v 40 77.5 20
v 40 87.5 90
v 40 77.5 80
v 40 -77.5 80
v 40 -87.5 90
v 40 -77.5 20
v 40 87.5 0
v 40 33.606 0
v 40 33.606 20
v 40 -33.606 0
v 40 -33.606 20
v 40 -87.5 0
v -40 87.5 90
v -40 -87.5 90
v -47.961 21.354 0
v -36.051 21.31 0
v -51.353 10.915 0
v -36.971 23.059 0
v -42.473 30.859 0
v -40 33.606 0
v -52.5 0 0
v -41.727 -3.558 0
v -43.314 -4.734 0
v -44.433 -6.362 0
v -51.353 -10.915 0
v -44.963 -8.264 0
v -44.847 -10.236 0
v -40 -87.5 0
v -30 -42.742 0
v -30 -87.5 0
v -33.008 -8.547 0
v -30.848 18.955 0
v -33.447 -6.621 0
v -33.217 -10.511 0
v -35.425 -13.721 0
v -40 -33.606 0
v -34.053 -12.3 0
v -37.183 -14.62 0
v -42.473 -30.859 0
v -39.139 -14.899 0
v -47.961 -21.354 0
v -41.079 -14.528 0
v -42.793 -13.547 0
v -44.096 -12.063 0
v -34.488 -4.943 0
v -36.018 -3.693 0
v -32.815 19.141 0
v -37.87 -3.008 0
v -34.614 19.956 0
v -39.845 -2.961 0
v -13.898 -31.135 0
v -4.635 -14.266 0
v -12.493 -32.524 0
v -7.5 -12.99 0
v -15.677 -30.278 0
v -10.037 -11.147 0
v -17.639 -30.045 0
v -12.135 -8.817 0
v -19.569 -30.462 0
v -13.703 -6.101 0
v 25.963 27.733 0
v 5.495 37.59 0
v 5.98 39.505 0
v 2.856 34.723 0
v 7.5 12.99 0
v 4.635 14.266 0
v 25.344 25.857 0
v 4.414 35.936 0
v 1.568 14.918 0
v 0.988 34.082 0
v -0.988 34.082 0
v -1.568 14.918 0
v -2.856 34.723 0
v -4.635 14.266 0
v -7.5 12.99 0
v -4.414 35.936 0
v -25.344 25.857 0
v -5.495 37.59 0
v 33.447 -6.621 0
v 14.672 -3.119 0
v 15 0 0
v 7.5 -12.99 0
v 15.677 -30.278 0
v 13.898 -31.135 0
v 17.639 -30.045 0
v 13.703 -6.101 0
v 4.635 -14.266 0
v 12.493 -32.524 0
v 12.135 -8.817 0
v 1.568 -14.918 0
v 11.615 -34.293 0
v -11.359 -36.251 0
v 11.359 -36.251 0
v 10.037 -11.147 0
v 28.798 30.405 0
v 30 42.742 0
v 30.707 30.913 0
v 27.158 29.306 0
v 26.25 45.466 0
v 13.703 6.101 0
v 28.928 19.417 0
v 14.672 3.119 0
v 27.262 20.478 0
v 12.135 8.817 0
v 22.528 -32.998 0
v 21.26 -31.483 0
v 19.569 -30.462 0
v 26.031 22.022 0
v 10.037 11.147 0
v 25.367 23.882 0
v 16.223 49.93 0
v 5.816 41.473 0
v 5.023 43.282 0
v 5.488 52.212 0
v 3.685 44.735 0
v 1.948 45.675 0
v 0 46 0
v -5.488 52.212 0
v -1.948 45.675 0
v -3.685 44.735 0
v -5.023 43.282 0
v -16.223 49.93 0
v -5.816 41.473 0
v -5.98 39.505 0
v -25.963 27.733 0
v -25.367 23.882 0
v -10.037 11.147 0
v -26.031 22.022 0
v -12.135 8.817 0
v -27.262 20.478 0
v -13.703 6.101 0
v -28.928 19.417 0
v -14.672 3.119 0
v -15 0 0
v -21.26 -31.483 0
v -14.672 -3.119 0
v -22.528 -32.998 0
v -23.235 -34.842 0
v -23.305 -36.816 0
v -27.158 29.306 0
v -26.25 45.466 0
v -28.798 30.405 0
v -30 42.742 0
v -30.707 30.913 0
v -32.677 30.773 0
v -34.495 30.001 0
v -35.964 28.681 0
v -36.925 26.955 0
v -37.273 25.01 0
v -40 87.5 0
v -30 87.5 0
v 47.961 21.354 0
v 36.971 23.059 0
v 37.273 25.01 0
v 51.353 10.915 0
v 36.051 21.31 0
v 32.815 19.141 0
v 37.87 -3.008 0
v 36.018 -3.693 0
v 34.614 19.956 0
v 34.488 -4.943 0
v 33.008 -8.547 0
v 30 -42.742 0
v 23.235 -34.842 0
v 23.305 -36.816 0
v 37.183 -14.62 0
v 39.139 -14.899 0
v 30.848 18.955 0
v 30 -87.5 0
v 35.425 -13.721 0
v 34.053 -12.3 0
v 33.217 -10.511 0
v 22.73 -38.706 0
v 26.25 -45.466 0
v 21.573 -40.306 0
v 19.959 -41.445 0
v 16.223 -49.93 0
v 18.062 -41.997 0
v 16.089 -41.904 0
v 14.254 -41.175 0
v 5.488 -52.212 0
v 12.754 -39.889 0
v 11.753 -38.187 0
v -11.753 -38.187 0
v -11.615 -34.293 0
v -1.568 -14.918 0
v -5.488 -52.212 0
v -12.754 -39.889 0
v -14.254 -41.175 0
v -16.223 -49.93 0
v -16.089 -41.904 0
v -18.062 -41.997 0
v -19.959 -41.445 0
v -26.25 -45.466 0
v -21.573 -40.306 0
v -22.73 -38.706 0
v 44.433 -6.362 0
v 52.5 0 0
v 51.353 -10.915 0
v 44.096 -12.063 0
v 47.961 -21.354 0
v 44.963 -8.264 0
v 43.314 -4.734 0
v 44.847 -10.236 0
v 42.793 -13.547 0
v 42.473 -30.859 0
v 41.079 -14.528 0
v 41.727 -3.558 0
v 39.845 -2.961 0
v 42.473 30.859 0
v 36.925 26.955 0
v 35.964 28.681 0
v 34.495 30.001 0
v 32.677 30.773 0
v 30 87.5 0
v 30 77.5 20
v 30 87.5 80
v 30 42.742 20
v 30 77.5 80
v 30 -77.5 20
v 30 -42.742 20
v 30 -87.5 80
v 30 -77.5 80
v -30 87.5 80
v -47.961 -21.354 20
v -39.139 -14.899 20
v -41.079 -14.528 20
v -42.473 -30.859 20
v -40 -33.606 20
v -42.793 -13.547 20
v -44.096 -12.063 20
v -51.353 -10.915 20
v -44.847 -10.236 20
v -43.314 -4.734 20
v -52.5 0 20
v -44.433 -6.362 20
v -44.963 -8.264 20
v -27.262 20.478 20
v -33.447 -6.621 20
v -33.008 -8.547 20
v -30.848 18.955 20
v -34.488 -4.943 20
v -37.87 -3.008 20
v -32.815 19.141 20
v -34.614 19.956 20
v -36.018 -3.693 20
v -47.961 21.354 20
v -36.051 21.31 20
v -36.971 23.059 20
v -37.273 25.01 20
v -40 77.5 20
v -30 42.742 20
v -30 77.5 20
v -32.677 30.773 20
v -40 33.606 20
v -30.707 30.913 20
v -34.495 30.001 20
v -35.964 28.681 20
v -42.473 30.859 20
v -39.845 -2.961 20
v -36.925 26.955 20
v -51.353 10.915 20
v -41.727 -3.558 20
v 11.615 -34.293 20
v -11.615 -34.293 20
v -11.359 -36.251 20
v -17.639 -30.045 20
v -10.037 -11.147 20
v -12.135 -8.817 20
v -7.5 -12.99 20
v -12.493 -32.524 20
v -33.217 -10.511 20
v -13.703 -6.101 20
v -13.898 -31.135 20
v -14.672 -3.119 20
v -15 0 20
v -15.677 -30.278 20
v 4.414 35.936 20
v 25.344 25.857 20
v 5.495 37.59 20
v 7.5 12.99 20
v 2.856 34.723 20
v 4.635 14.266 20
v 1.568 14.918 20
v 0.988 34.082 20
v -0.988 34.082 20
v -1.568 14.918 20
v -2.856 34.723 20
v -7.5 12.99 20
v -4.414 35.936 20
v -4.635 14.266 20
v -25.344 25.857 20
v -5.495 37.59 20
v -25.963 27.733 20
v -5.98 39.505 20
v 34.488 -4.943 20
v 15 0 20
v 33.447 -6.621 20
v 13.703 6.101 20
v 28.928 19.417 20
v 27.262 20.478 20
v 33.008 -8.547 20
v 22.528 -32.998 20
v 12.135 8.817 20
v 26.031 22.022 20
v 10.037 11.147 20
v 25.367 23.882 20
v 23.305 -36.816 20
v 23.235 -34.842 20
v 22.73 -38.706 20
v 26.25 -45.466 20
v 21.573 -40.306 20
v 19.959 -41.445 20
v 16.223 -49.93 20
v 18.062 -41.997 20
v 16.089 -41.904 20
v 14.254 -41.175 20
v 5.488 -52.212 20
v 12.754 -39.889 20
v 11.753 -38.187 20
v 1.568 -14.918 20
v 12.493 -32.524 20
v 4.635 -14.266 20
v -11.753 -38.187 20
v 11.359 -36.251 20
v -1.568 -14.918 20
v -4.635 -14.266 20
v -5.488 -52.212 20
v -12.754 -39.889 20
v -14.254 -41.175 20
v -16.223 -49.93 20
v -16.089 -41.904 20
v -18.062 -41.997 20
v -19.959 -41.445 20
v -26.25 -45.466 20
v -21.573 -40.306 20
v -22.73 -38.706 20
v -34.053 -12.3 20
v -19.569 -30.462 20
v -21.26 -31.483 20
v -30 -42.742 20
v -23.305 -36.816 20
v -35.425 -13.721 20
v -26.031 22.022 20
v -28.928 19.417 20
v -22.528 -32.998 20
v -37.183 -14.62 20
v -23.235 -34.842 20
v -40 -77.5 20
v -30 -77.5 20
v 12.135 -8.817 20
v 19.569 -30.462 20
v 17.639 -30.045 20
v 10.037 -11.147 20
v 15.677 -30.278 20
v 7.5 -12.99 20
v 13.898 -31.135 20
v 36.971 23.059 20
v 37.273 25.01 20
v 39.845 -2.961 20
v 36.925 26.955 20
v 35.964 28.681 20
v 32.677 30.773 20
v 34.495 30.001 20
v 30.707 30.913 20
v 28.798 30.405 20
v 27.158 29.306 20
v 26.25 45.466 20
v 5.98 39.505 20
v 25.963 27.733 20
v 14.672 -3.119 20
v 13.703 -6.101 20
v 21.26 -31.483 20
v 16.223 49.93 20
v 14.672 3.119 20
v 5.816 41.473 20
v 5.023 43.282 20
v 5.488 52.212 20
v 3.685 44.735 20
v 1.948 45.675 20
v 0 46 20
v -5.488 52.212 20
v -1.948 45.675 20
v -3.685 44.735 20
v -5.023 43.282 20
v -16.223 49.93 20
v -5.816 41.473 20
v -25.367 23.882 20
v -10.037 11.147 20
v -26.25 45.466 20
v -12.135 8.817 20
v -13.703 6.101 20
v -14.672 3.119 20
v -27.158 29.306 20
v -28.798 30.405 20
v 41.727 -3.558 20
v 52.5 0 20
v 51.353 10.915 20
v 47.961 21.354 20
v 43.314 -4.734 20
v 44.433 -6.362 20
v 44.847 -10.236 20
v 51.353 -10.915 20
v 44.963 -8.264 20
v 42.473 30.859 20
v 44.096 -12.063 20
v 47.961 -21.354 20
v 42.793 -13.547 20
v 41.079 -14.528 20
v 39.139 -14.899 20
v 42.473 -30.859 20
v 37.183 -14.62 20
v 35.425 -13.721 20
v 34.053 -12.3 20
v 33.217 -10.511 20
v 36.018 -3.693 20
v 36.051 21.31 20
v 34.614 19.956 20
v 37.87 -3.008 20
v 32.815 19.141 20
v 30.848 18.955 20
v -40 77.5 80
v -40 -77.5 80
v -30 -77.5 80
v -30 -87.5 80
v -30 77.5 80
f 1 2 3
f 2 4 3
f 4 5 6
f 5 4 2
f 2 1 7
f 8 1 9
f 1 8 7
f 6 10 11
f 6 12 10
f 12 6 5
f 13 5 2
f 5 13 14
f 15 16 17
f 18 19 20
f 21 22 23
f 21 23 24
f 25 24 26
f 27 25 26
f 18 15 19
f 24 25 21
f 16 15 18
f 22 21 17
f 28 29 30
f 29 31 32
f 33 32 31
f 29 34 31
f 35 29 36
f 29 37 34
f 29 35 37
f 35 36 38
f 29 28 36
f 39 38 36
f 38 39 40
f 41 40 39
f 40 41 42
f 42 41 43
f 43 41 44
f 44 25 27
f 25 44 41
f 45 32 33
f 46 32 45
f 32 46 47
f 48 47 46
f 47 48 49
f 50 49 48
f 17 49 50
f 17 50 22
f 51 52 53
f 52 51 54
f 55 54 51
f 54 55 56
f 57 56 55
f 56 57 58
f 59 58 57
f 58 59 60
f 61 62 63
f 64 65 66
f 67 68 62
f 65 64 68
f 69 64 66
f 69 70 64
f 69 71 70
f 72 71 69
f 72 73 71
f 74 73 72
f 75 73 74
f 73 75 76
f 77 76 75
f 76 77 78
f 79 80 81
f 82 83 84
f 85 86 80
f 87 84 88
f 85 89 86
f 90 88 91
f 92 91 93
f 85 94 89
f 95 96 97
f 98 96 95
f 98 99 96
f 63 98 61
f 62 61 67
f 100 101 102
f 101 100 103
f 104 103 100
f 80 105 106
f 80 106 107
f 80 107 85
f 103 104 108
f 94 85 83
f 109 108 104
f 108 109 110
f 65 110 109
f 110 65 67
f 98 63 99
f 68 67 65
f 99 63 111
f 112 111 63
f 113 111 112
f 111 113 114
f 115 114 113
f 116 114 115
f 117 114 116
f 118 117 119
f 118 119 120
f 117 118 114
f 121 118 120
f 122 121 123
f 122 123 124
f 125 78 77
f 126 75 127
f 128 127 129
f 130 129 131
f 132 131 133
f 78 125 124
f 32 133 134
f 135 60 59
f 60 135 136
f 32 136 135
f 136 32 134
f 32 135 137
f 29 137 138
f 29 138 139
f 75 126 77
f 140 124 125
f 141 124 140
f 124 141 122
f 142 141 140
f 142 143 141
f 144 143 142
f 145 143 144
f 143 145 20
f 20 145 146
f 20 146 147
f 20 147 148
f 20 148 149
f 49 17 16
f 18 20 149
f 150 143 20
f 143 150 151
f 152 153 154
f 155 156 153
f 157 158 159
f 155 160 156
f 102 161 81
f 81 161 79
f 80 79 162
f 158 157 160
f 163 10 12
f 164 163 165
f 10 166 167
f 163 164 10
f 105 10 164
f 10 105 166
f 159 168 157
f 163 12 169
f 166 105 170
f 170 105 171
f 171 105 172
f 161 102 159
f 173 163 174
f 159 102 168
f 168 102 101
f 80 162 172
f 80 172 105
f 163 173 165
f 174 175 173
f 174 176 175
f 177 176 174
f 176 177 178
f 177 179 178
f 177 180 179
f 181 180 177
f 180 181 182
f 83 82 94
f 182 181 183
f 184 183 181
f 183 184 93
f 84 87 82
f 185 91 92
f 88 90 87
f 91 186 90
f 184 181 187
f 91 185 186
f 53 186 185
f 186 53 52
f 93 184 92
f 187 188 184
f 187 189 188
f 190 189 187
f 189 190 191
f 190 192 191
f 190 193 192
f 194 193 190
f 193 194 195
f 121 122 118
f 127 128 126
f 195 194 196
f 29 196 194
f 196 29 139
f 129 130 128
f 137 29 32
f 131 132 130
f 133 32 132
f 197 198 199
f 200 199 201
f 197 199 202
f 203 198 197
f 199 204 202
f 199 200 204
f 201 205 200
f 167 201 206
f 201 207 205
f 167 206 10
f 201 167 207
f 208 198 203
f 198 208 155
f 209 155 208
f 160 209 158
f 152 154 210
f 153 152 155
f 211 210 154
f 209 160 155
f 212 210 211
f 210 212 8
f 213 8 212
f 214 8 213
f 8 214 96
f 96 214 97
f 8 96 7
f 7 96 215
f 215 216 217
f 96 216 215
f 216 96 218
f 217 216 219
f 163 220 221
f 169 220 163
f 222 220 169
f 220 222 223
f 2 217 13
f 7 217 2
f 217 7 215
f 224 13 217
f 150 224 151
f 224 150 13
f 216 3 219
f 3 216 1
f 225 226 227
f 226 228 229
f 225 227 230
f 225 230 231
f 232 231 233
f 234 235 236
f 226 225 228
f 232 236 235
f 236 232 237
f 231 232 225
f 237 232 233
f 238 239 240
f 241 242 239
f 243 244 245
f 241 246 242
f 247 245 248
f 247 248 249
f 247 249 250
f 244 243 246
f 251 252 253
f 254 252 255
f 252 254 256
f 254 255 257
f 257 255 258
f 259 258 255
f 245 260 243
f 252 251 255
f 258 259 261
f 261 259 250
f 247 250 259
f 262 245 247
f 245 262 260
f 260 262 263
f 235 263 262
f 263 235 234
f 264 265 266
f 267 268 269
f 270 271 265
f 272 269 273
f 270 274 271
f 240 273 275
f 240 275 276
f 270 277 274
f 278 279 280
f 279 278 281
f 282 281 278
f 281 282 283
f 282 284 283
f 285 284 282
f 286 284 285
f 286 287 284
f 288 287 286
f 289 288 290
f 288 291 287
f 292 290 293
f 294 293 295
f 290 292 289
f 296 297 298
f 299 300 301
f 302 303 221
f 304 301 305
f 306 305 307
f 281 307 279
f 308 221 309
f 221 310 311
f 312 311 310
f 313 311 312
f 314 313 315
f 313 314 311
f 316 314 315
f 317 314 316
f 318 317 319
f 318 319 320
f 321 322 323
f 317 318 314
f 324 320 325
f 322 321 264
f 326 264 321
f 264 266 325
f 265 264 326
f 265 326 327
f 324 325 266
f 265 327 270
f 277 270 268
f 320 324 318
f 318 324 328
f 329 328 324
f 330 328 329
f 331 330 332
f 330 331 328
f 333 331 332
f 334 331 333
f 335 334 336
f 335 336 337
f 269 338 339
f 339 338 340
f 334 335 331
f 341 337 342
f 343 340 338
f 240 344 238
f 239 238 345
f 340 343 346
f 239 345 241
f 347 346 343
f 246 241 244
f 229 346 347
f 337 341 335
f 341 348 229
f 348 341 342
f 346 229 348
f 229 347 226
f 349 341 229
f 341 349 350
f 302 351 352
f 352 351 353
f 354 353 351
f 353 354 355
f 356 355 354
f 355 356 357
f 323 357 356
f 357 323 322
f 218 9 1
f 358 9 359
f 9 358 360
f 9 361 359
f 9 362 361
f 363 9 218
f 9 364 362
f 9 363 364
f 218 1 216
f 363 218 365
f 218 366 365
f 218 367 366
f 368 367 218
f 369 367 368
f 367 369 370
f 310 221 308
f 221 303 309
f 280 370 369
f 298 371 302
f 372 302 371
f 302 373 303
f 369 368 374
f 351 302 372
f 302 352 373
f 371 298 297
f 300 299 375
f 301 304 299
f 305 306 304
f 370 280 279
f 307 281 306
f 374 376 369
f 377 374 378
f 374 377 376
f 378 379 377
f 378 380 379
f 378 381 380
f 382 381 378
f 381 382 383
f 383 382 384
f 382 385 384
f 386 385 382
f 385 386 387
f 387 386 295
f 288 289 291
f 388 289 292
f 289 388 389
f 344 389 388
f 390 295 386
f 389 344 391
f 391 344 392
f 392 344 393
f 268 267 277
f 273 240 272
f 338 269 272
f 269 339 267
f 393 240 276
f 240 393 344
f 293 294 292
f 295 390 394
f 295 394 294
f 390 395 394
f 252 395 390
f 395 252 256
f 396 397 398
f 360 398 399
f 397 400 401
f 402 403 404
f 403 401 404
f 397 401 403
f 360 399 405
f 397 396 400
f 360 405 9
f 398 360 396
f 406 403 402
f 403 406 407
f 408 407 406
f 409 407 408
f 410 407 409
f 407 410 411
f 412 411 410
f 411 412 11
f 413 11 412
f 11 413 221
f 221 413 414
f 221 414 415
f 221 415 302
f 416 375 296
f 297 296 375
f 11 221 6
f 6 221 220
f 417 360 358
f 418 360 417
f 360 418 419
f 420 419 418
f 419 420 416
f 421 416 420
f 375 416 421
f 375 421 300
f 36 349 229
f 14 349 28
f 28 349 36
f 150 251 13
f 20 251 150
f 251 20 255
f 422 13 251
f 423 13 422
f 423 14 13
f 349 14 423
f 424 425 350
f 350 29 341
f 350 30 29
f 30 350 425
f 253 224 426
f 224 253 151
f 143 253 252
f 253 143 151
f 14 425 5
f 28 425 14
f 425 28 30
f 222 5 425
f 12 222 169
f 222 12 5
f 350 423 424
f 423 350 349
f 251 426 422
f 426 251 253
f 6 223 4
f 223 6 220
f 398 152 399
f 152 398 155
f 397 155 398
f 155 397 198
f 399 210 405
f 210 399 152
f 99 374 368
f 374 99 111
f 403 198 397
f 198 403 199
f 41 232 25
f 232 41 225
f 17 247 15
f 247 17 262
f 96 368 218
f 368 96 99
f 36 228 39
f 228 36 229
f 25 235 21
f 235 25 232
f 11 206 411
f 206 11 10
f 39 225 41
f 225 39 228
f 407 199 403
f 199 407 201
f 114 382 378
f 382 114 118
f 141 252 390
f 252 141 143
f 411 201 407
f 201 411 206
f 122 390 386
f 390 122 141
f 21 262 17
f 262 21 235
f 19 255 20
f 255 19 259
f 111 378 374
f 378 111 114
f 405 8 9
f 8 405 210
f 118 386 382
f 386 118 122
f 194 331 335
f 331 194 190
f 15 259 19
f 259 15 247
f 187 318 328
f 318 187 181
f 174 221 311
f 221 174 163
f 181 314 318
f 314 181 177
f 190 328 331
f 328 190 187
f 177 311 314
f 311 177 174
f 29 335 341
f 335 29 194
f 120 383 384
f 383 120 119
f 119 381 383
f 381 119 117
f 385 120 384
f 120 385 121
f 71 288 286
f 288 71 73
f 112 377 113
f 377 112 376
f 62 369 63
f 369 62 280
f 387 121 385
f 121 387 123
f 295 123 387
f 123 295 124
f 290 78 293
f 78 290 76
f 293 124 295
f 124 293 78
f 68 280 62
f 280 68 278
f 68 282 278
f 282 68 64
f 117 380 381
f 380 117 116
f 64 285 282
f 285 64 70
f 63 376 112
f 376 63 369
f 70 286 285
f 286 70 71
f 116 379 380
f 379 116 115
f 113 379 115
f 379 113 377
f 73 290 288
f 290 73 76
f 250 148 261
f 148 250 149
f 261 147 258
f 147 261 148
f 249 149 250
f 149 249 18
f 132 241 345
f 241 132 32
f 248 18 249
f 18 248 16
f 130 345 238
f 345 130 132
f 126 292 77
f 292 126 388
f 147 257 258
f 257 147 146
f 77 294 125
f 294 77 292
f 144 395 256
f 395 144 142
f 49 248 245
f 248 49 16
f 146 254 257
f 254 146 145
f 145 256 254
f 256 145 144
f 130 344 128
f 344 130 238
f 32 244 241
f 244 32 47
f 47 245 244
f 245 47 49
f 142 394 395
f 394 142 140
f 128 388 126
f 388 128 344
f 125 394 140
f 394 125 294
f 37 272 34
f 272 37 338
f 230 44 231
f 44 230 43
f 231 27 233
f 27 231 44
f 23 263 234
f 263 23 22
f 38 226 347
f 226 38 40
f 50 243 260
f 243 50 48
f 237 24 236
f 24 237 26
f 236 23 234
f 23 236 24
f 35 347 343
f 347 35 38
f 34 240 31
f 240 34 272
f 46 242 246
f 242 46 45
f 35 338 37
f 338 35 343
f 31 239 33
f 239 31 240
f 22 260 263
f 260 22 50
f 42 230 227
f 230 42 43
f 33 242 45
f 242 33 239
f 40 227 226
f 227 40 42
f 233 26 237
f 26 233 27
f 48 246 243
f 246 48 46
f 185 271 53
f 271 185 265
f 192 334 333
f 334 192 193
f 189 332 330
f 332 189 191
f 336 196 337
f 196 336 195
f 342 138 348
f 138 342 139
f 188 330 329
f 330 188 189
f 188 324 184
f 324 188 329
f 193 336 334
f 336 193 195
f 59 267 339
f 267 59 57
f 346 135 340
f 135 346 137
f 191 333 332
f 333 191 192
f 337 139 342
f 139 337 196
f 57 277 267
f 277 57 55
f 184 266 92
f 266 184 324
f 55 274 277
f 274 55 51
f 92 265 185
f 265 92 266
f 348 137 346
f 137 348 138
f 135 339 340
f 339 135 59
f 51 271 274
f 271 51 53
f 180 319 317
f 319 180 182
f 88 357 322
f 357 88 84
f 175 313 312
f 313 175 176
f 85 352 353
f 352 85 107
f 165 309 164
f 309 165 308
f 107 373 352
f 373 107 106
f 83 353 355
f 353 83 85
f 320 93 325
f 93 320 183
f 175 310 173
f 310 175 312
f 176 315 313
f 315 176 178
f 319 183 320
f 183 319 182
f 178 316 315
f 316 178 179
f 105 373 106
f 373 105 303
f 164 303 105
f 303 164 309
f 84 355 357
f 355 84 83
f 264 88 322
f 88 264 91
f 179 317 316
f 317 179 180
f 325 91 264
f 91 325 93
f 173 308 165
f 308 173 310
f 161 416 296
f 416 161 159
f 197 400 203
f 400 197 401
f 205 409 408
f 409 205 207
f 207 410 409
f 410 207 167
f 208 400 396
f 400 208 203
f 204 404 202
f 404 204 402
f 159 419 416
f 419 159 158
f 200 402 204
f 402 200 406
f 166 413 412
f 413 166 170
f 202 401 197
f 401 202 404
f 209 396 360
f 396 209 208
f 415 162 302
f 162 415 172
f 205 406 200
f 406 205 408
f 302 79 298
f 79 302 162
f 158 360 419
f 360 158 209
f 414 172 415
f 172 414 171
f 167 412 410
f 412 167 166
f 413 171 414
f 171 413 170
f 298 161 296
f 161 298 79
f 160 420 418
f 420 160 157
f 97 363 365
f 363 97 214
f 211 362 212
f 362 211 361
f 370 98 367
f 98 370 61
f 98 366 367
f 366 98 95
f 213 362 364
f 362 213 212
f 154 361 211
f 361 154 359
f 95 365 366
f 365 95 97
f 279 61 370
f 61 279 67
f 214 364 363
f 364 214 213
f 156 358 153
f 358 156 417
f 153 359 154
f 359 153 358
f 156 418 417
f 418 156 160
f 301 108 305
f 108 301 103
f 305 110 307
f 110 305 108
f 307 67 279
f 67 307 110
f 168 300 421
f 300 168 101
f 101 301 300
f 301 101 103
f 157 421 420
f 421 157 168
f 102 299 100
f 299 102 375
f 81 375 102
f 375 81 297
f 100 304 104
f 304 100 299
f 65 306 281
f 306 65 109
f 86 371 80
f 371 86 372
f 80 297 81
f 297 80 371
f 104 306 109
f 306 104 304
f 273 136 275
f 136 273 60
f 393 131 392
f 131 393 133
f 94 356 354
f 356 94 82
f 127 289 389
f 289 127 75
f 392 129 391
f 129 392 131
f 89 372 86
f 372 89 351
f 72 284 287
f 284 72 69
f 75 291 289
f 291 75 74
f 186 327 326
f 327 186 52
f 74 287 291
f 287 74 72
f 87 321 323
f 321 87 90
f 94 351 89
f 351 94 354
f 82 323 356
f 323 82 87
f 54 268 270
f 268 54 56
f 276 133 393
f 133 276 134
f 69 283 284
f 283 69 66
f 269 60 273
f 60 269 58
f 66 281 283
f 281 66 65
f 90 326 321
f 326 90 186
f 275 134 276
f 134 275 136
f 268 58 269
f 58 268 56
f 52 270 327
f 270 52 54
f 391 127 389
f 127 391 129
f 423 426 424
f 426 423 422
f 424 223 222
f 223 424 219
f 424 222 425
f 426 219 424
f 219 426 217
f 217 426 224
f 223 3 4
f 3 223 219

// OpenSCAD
mainCylinderRadius = 52.50;
mainCylinderDepth = 20;
mainCylinderCenterDiameterCut = 30;

cylinderGuideThroughHoleDiameter = 80;
cylinderRadiusThroughCuts = 12;
NumberOfCylinders = 7;

cubeHeight = 80;
cubeWidth = 175;
cubeDepth = 10;
    translatecubeX = -cubeHeight / 2;
    translatecubeY = -cubeWidth / 2;
    translatecubeZ = 90 ;

strutLegHeight = 10;
strutLegWidth = 10;
strutLegDepth = 90;
    strutLegTransX = (cubeHeight / 2) - strutLegHeight;
    strutLegTransY = (cubeWidth / 2) - strutLegWidth;
    strutLegTransZ = 0;
    

//Main Objects
difference(){
    union(){
        cylinder(mainCylinderDepth, r = mainCylinderRadius);//Main cylinder
        Strut();
        rotate(180)Strut();
        mirror([1,0,0])Strut();
        mirror([0,1,0])Strut();
    }

cylinder(mainCylinderDepth, d = mainCylinderCenterDiameterCut);

rotate(90)orbital_cuts();
}

translate([translatecubeX, translatecubeY, translatecubeZ - cubeDepth])
cube([cubeHeight, cubeWidth, cubeDepth]);//back plate

module Strut(){
    translate([strutLegTransX, strutLegTransY, strutLegTransZ])
    cube([strutLegHeight, strutLegWidth, strutLegDepth]);// orignal srtut leg

    translate([strutLegTransX, strutLegTransY, strutLegTransZ])
    rotate([90, 0, 0])
    cube([strutLegHeight, mainCylinderDepth, strutLegDepth]);// orignal strut
}

module orbital_cuts(){
    for (Holes = [0:360/NumberOfCylinders:360] ){
        rotate([0, 0, Holes])
        translate([cylinderGuideThroughHoleDiameter / 2, 0, 0])
        cylinder(mainCylinderDepth, d = cylinderRadiusThroughCuts );
        }// hehe cuts circles in a circle
}
